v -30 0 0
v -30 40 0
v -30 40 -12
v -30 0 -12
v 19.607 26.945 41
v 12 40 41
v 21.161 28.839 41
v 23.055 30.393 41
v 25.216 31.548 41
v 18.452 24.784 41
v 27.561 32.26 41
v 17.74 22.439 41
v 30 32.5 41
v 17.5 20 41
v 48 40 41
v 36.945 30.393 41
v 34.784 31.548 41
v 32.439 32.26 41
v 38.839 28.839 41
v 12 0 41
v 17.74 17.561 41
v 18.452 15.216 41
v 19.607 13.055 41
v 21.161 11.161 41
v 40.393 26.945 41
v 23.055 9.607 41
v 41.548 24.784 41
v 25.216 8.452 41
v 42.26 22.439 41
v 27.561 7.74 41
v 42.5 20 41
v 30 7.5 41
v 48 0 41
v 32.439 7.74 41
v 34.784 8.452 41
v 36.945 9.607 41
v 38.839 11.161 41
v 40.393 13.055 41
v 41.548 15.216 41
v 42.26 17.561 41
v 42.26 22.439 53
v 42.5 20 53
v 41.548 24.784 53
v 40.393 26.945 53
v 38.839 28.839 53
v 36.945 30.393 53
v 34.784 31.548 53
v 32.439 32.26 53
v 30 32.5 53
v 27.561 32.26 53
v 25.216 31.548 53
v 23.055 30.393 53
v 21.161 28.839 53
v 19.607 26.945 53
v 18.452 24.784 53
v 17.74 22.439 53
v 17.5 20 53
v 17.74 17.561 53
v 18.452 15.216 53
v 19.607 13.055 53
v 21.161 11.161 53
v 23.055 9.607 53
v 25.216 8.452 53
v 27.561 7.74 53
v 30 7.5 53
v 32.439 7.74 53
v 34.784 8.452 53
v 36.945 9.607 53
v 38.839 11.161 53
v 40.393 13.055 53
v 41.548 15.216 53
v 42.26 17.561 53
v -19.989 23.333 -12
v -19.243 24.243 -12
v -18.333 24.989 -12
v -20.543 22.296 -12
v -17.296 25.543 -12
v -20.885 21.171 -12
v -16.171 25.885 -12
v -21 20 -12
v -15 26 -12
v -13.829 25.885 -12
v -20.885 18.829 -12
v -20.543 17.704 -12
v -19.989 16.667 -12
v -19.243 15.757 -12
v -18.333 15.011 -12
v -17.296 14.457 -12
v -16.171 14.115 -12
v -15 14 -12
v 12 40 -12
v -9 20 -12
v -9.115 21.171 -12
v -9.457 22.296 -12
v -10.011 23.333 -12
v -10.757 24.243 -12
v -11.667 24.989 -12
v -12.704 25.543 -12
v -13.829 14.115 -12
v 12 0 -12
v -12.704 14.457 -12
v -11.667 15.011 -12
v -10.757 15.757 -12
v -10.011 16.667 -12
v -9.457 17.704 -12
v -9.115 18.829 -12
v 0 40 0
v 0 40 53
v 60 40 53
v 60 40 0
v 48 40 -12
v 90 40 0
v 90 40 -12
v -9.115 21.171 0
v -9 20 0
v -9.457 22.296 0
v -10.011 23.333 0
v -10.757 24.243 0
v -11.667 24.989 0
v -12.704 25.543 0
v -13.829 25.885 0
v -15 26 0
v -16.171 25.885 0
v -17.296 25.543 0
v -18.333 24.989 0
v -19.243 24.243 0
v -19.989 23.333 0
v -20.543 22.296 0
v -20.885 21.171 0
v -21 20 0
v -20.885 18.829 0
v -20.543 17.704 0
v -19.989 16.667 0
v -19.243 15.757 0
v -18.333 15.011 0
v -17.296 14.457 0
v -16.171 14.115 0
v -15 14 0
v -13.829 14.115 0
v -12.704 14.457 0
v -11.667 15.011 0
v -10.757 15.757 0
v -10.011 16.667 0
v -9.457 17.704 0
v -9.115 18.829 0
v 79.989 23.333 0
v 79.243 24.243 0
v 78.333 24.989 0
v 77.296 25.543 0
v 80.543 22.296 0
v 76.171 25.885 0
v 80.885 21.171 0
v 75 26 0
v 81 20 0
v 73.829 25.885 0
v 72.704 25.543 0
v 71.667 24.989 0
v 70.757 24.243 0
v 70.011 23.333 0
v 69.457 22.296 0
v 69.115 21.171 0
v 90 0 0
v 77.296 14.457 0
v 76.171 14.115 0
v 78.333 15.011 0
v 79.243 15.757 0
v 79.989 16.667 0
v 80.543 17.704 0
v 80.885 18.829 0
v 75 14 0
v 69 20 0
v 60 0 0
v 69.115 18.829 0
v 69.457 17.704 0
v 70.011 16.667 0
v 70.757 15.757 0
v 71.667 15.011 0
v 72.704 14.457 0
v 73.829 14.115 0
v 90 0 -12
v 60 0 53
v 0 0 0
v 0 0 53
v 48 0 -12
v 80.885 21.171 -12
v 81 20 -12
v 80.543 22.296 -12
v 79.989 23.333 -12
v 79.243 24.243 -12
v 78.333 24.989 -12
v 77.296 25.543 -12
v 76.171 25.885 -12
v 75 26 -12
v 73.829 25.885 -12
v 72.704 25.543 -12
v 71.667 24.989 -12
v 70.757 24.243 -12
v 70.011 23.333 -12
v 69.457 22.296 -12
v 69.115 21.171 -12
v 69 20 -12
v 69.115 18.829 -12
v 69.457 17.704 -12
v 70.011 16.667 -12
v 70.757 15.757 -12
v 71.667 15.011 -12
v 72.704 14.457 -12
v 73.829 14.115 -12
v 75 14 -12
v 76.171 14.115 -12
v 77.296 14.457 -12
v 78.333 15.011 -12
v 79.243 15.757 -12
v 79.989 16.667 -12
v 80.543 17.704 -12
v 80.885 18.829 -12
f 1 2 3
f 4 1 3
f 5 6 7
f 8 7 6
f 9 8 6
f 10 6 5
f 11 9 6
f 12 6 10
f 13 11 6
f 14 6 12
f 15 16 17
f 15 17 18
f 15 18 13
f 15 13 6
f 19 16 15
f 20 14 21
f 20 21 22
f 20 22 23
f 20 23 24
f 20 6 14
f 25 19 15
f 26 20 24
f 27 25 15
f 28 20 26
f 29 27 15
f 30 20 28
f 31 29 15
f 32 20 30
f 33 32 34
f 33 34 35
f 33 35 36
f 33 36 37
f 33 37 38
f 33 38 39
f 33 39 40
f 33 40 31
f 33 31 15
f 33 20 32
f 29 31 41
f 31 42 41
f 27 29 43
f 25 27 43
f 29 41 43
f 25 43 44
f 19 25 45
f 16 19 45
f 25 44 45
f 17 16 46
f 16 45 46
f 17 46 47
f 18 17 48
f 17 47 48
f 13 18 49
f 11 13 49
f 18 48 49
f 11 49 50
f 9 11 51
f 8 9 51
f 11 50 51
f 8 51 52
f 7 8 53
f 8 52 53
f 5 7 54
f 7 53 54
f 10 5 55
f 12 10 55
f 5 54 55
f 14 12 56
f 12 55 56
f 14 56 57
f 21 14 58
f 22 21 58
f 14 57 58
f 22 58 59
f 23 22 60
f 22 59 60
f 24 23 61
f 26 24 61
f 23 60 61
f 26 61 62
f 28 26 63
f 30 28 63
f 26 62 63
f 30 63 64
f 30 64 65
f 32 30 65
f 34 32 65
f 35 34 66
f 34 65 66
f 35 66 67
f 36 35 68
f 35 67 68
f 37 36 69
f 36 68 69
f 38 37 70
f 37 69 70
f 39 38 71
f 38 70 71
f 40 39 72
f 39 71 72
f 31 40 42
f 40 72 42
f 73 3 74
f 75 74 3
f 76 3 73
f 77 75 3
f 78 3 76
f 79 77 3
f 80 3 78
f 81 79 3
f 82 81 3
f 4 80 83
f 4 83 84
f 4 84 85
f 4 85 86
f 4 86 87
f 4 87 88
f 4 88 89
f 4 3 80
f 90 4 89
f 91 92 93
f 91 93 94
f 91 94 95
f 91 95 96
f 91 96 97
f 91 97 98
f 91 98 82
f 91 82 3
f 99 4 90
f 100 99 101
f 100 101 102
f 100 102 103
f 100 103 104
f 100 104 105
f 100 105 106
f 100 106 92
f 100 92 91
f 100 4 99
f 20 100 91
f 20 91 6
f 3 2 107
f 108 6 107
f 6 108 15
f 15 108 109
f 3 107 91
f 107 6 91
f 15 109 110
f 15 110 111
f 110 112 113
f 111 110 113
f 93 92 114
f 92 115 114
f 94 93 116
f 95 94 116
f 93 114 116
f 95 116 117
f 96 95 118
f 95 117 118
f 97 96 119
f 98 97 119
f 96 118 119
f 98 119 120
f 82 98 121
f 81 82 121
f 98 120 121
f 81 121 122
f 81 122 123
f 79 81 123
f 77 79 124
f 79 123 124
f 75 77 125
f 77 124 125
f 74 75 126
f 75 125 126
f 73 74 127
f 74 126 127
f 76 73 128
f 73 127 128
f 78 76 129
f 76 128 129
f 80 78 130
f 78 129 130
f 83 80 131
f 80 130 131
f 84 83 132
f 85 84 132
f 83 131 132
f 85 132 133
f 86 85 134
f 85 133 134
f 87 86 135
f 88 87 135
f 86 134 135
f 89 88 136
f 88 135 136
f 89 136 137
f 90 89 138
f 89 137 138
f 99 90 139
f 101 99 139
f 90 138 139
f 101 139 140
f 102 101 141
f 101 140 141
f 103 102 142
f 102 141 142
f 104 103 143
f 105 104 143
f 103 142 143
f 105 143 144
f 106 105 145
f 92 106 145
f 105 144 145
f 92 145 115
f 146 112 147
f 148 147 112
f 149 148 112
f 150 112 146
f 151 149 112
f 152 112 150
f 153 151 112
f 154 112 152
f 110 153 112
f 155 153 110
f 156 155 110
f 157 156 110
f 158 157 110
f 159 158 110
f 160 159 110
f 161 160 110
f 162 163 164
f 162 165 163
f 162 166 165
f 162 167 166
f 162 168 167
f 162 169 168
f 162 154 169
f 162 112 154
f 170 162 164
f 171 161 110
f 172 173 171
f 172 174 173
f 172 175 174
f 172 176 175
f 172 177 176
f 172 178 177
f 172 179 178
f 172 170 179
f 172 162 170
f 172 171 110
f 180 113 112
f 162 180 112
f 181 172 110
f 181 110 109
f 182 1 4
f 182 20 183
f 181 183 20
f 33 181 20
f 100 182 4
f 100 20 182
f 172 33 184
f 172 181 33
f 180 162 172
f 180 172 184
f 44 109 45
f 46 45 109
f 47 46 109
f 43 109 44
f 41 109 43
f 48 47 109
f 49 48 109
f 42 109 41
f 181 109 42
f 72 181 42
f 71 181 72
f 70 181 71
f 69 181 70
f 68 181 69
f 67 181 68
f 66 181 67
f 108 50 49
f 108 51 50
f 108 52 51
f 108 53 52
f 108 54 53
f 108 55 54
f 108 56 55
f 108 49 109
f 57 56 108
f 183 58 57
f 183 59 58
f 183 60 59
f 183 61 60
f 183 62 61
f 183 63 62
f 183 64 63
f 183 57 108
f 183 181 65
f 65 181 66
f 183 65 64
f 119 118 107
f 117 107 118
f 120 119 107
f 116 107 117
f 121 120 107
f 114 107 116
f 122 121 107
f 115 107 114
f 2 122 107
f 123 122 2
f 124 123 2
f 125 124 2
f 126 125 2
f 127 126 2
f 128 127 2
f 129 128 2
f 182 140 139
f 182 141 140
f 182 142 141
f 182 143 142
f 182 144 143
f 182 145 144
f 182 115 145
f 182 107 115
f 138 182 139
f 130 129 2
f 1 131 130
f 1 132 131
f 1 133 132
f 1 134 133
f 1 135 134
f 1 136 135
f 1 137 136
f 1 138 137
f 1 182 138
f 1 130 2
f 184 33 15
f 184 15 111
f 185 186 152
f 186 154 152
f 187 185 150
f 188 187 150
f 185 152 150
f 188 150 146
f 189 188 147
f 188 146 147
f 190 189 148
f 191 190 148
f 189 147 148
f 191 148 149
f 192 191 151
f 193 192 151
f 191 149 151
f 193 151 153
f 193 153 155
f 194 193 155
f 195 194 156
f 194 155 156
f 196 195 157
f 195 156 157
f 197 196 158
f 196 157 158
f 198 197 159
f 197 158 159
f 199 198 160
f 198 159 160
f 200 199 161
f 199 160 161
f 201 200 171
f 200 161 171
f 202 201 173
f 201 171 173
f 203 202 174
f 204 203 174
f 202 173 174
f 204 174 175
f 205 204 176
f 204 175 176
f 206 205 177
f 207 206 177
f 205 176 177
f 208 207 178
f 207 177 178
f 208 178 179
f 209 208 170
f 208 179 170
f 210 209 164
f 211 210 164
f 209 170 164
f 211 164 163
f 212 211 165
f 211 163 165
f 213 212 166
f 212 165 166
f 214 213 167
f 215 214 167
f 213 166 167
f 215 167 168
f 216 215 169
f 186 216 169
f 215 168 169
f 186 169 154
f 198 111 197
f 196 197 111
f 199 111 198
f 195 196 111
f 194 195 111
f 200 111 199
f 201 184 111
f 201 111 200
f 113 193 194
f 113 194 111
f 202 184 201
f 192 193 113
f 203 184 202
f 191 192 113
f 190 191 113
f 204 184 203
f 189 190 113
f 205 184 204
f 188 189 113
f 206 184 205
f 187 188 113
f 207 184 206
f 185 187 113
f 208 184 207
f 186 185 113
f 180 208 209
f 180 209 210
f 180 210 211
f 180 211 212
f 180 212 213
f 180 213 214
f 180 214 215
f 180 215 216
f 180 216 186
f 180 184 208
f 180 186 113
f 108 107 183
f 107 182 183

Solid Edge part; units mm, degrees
sketch "Sketch1" plane through (0, 0, 0) normal (0, -1, 0) x (1, 0, 0)
  line L0 (60, 53) -> (0, 53)
  line L1 (0, 0) -> (0, 53)
  line L2 (0, 0) -> (-30, 0)
  line L3 (-30, 0) -> (-30, -12)
  line L4 (-30, -12) -> (12, -12)
  line L5 (12, -12) -> (12, 41)
  line L6 (12, 41) -> (48, 41)
  line L7 (48, 41) -> (48, -12)
  line L8 (48, -12) -> (90, -12)
  line L9 (90, -12) -> (90, 0)
  line L10 (90, 0) -> (60, 0)
  line L11 (60, 0) -> (60, 53)
extrude "Protrusion1" add sketch "Sketch1" against normal blind 40
sketch "Sketch2" plane through (30, 20, 53) normal (0, 0, 1) x (1, 0, 0)
  circle A0 centre (-45, 0) radius 6
  circle A1 centre (45, 0) radius 6
  circle A2 centre (0, 0) radius 12.5
extrude "ExtrudedCutout_1" cut sketch "Sketch2" against normal blind 65
